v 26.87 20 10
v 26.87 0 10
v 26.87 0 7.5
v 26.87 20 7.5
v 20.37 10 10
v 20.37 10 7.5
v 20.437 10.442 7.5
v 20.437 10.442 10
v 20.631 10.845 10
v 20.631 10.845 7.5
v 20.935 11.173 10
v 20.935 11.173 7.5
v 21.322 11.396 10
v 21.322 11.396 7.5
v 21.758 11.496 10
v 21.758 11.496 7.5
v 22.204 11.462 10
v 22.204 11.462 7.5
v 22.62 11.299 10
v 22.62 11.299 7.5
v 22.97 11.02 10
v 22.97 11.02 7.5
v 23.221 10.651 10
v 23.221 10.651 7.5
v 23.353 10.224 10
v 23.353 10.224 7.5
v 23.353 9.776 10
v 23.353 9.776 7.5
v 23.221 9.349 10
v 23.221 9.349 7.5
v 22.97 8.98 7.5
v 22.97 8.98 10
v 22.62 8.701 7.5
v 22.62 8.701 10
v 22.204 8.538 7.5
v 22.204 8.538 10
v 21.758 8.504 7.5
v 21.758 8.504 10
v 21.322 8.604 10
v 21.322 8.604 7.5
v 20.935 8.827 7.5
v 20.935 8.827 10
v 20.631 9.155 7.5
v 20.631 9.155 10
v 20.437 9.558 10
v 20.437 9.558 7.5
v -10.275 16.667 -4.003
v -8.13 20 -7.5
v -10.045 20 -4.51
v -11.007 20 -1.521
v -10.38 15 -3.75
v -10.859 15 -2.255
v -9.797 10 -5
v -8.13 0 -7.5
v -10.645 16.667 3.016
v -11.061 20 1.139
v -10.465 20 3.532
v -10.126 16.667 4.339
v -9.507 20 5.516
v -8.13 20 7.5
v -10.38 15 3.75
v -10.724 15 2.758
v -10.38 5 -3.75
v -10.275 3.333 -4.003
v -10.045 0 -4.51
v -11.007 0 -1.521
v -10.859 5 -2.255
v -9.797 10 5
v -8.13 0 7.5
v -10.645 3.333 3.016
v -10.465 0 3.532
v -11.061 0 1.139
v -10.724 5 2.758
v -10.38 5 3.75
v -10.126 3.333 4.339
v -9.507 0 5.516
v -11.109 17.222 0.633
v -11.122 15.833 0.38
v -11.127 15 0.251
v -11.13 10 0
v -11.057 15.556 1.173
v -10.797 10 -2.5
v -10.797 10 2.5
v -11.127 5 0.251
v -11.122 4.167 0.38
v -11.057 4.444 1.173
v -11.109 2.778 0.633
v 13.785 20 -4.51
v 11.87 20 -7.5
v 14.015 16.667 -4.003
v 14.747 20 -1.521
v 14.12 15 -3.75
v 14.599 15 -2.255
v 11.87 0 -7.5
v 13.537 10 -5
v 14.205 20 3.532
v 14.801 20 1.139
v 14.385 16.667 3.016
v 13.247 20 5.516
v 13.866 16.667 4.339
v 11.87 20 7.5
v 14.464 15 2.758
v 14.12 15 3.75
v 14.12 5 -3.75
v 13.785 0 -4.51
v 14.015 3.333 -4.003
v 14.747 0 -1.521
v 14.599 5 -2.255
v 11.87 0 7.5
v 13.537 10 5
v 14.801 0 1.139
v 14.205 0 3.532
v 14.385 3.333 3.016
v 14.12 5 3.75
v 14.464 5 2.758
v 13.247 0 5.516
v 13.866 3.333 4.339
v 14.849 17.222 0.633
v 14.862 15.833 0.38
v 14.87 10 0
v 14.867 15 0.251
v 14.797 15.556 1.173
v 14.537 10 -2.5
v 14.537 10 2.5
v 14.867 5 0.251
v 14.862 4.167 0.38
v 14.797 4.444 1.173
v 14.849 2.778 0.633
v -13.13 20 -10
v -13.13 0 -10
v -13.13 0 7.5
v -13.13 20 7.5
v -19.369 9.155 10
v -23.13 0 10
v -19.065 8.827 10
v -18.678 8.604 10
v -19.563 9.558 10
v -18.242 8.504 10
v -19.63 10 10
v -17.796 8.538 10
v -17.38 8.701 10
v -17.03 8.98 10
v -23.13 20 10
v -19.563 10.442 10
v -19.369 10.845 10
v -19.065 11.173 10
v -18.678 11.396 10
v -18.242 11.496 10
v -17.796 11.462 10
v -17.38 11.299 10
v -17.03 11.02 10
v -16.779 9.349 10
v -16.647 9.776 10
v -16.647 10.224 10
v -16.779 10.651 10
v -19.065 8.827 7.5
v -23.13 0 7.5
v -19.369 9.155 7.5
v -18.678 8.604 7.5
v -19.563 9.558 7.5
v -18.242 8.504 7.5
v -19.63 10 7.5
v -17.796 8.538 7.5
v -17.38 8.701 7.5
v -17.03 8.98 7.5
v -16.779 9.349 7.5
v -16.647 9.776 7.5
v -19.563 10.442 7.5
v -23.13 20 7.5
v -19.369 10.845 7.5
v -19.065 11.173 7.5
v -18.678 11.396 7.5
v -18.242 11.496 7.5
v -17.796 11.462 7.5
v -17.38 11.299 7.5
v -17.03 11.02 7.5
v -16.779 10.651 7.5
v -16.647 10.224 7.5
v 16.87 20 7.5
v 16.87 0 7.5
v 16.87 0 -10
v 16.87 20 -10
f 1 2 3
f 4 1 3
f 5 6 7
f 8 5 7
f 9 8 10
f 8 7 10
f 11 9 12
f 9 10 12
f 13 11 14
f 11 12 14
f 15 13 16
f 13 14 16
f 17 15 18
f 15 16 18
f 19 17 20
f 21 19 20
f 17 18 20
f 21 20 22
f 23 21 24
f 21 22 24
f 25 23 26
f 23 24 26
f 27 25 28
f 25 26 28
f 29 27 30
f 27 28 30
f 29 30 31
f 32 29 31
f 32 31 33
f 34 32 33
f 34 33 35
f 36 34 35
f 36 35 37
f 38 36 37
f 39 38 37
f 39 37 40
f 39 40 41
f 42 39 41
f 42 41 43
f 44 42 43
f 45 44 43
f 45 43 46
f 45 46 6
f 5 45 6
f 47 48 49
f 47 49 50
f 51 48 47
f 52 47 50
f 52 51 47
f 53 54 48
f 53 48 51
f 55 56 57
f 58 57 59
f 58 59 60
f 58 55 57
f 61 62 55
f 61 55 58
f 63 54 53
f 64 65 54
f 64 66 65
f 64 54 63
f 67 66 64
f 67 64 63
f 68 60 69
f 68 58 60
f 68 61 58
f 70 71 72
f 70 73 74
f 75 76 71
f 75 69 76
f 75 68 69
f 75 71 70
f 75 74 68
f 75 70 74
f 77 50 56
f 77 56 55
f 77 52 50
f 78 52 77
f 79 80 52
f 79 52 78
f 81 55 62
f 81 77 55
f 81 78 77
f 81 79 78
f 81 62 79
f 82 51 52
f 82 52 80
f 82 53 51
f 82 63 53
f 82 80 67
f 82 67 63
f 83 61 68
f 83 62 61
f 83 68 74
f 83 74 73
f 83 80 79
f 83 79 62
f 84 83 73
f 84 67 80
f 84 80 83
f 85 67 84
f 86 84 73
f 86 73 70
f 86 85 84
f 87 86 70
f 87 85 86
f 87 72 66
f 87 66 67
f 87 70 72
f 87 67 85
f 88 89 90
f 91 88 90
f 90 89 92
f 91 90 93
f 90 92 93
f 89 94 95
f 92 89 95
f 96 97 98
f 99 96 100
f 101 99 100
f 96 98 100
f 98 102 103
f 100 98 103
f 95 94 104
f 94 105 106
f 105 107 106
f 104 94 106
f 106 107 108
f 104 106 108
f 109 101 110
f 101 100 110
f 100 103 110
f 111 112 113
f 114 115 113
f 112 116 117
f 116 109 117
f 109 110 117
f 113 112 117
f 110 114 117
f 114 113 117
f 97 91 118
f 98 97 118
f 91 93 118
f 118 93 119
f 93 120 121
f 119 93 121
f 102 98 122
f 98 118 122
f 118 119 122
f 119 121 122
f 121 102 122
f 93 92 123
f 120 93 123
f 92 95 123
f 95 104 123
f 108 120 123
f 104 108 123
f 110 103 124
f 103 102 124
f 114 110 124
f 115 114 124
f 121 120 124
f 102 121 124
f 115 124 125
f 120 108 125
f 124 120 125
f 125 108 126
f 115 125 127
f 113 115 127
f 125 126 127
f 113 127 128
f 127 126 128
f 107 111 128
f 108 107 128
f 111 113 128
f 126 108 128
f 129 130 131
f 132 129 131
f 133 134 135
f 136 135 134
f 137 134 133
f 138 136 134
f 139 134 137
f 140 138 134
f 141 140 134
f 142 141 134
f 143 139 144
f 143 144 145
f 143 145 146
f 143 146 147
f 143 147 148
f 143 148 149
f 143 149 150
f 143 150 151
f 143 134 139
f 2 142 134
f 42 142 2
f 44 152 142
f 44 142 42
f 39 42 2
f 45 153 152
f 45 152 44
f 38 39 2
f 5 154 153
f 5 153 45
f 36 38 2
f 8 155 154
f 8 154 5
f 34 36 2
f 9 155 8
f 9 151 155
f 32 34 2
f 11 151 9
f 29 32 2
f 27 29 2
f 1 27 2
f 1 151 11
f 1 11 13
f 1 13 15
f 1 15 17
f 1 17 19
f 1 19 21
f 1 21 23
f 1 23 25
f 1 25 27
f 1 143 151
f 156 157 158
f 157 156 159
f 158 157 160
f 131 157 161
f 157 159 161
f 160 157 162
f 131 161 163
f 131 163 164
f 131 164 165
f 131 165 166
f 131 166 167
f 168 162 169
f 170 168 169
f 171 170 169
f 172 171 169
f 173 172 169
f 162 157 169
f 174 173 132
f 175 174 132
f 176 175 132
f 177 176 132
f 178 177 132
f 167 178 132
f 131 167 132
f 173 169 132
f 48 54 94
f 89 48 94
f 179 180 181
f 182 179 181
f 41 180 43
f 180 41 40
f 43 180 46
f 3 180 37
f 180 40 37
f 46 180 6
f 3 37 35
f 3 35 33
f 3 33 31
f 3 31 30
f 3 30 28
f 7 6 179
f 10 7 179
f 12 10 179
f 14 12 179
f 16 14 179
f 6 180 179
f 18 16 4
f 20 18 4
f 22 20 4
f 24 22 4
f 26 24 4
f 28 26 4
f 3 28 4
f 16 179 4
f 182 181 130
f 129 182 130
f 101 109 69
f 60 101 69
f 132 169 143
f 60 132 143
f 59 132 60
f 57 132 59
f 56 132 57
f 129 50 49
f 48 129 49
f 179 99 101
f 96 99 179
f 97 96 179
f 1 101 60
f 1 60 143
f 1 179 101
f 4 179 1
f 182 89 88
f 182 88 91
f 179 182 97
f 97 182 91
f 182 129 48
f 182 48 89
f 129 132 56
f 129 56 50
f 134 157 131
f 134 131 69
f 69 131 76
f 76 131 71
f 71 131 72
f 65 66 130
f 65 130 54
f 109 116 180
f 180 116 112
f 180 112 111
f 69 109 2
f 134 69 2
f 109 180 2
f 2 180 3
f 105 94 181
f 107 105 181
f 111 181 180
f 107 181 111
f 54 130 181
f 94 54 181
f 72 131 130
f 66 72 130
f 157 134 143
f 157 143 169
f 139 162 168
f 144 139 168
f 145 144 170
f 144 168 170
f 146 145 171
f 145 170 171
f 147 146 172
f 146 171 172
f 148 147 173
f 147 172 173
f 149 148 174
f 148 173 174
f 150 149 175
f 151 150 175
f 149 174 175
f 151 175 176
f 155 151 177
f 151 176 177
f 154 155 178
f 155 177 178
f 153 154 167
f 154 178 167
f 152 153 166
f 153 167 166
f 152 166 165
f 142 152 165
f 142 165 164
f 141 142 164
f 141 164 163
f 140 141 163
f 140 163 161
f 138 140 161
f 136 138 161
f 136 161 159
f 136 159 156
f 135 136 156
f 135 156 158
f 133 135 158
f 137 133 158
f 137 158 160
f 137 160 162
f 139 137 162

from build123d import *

# Parameters (mm, degrees)
BOSS_EXTRUDE3_DEPTH = 20
SKETCH2_W           = 10
SKETCH2_H           = 2.5
BOSS_EXTRUDE6_DEPTH = 20
SKETCH5_R           = 1.5
CUT_EXTRUDE1_DEPTH  = 20


with BuildPart() as part:
    # Sketch1 → Boss-Extrude3 (new body)
    with BuildSketch(Plane(origin=(0, 0, 0), x_dir=(1, 0, 0), z_dir=(0, 1, 0))):
        with BuildLine():
            add(Edge.make_bspline(
                [(-8.130019969, 7.5), (-11.130019969, 3.75), (-11.130019969, 0)],
                knots=[0, 0, 0, 0.5, 0.5, 0.5], degree=2))
            Line((-8.130019969, 7.5), (-13.130019969, 7.5))
            Line((-13.130019969, 7.5), (-13.130019969, -10))
            Line((-13.130019969, -10), (16.869980031, -10))
            Line((16.869980031, -10), (16.869980031, -7.5))
            Line((16.869980031, -7.5), (11.869980031, -7.5))
            Line((11.869980031, -7.5), (-8.130019969, -7.5))
            add(Edge.make_bspline(
                [(-11.130019969, 0), (-11.130019969, -3.75), (-8.130019969, -7.5)],
                knots=[0.5, 0.5, 0.5, 1, 1, 1], degree=2))
        make_face()
        with BuildLine():
            Line((-13.130019969, 7.5), (-8.130019969, 7.5))
            Line((-8.130019969, 7.5), (11.869980031, 7.5))
            add(Edge.make_bspline(
                [(11.869980031, 7.5), (14.869980031, 3.75), (14.869980031, 0)],
                knots=[0, 0, 0, 0.5, 0.5, 0.5], degree=2))
            add(Edge.make_bspline(
                [(14.869980031, 0), (14.869980031, -3.75), (11.869980031, -7.5)],
                knots=[0.5, 0.5, 0.5, 1, 1, 1], degree=2))
            Line((11.869980031, -7.5), (16.869980031, -7.5))
            Line((16.869980031, -7.5), (16.869980031, 10))
            Line((16.869980031, 10), (-13.130019969, 10))
            Line((-13.130019969, 10), (-13.130019969, 7.5))
        make_face()
    extrude(amount=BOSS_EXTRUDE3_DEPTH)

    # Sketch2 → Boss-Extrude6 (add)
    with BuildSketch(Plane(origin=(0, 20, 0), x_dir=(1, 0, 0), z_dir=(0, 1, 0))):
        with Locations((21.869980031, -8.75)):
            Rectangle(SKETCH2_W, SKETCH2_H)
        with Locations((-18.130019969, -8.75)):
            Rectangle(SKETCH2_W, SKETCH2_H)
    extrude(amount=-BOSS_EXTRUDE6_DEPTH)

    # Sketch5 → Cut-Extrude1 (cut)
    with BuildSketch(Plane(origin=(0, 0, 7.5), x_dir=(-1, 0, 0), z_dir=(0, 0, -1))):
        with Locations((18.130019969, 10)):
            Circle(SKETCH5_R)
        with Locations((-21.869980031, 10)):
            Circle(SKETCH5_R)
    extrude(amount=-CUT_EXTRUDE1_DEPTH, mode=Mode.SUBTRACT)


solid = part.part
